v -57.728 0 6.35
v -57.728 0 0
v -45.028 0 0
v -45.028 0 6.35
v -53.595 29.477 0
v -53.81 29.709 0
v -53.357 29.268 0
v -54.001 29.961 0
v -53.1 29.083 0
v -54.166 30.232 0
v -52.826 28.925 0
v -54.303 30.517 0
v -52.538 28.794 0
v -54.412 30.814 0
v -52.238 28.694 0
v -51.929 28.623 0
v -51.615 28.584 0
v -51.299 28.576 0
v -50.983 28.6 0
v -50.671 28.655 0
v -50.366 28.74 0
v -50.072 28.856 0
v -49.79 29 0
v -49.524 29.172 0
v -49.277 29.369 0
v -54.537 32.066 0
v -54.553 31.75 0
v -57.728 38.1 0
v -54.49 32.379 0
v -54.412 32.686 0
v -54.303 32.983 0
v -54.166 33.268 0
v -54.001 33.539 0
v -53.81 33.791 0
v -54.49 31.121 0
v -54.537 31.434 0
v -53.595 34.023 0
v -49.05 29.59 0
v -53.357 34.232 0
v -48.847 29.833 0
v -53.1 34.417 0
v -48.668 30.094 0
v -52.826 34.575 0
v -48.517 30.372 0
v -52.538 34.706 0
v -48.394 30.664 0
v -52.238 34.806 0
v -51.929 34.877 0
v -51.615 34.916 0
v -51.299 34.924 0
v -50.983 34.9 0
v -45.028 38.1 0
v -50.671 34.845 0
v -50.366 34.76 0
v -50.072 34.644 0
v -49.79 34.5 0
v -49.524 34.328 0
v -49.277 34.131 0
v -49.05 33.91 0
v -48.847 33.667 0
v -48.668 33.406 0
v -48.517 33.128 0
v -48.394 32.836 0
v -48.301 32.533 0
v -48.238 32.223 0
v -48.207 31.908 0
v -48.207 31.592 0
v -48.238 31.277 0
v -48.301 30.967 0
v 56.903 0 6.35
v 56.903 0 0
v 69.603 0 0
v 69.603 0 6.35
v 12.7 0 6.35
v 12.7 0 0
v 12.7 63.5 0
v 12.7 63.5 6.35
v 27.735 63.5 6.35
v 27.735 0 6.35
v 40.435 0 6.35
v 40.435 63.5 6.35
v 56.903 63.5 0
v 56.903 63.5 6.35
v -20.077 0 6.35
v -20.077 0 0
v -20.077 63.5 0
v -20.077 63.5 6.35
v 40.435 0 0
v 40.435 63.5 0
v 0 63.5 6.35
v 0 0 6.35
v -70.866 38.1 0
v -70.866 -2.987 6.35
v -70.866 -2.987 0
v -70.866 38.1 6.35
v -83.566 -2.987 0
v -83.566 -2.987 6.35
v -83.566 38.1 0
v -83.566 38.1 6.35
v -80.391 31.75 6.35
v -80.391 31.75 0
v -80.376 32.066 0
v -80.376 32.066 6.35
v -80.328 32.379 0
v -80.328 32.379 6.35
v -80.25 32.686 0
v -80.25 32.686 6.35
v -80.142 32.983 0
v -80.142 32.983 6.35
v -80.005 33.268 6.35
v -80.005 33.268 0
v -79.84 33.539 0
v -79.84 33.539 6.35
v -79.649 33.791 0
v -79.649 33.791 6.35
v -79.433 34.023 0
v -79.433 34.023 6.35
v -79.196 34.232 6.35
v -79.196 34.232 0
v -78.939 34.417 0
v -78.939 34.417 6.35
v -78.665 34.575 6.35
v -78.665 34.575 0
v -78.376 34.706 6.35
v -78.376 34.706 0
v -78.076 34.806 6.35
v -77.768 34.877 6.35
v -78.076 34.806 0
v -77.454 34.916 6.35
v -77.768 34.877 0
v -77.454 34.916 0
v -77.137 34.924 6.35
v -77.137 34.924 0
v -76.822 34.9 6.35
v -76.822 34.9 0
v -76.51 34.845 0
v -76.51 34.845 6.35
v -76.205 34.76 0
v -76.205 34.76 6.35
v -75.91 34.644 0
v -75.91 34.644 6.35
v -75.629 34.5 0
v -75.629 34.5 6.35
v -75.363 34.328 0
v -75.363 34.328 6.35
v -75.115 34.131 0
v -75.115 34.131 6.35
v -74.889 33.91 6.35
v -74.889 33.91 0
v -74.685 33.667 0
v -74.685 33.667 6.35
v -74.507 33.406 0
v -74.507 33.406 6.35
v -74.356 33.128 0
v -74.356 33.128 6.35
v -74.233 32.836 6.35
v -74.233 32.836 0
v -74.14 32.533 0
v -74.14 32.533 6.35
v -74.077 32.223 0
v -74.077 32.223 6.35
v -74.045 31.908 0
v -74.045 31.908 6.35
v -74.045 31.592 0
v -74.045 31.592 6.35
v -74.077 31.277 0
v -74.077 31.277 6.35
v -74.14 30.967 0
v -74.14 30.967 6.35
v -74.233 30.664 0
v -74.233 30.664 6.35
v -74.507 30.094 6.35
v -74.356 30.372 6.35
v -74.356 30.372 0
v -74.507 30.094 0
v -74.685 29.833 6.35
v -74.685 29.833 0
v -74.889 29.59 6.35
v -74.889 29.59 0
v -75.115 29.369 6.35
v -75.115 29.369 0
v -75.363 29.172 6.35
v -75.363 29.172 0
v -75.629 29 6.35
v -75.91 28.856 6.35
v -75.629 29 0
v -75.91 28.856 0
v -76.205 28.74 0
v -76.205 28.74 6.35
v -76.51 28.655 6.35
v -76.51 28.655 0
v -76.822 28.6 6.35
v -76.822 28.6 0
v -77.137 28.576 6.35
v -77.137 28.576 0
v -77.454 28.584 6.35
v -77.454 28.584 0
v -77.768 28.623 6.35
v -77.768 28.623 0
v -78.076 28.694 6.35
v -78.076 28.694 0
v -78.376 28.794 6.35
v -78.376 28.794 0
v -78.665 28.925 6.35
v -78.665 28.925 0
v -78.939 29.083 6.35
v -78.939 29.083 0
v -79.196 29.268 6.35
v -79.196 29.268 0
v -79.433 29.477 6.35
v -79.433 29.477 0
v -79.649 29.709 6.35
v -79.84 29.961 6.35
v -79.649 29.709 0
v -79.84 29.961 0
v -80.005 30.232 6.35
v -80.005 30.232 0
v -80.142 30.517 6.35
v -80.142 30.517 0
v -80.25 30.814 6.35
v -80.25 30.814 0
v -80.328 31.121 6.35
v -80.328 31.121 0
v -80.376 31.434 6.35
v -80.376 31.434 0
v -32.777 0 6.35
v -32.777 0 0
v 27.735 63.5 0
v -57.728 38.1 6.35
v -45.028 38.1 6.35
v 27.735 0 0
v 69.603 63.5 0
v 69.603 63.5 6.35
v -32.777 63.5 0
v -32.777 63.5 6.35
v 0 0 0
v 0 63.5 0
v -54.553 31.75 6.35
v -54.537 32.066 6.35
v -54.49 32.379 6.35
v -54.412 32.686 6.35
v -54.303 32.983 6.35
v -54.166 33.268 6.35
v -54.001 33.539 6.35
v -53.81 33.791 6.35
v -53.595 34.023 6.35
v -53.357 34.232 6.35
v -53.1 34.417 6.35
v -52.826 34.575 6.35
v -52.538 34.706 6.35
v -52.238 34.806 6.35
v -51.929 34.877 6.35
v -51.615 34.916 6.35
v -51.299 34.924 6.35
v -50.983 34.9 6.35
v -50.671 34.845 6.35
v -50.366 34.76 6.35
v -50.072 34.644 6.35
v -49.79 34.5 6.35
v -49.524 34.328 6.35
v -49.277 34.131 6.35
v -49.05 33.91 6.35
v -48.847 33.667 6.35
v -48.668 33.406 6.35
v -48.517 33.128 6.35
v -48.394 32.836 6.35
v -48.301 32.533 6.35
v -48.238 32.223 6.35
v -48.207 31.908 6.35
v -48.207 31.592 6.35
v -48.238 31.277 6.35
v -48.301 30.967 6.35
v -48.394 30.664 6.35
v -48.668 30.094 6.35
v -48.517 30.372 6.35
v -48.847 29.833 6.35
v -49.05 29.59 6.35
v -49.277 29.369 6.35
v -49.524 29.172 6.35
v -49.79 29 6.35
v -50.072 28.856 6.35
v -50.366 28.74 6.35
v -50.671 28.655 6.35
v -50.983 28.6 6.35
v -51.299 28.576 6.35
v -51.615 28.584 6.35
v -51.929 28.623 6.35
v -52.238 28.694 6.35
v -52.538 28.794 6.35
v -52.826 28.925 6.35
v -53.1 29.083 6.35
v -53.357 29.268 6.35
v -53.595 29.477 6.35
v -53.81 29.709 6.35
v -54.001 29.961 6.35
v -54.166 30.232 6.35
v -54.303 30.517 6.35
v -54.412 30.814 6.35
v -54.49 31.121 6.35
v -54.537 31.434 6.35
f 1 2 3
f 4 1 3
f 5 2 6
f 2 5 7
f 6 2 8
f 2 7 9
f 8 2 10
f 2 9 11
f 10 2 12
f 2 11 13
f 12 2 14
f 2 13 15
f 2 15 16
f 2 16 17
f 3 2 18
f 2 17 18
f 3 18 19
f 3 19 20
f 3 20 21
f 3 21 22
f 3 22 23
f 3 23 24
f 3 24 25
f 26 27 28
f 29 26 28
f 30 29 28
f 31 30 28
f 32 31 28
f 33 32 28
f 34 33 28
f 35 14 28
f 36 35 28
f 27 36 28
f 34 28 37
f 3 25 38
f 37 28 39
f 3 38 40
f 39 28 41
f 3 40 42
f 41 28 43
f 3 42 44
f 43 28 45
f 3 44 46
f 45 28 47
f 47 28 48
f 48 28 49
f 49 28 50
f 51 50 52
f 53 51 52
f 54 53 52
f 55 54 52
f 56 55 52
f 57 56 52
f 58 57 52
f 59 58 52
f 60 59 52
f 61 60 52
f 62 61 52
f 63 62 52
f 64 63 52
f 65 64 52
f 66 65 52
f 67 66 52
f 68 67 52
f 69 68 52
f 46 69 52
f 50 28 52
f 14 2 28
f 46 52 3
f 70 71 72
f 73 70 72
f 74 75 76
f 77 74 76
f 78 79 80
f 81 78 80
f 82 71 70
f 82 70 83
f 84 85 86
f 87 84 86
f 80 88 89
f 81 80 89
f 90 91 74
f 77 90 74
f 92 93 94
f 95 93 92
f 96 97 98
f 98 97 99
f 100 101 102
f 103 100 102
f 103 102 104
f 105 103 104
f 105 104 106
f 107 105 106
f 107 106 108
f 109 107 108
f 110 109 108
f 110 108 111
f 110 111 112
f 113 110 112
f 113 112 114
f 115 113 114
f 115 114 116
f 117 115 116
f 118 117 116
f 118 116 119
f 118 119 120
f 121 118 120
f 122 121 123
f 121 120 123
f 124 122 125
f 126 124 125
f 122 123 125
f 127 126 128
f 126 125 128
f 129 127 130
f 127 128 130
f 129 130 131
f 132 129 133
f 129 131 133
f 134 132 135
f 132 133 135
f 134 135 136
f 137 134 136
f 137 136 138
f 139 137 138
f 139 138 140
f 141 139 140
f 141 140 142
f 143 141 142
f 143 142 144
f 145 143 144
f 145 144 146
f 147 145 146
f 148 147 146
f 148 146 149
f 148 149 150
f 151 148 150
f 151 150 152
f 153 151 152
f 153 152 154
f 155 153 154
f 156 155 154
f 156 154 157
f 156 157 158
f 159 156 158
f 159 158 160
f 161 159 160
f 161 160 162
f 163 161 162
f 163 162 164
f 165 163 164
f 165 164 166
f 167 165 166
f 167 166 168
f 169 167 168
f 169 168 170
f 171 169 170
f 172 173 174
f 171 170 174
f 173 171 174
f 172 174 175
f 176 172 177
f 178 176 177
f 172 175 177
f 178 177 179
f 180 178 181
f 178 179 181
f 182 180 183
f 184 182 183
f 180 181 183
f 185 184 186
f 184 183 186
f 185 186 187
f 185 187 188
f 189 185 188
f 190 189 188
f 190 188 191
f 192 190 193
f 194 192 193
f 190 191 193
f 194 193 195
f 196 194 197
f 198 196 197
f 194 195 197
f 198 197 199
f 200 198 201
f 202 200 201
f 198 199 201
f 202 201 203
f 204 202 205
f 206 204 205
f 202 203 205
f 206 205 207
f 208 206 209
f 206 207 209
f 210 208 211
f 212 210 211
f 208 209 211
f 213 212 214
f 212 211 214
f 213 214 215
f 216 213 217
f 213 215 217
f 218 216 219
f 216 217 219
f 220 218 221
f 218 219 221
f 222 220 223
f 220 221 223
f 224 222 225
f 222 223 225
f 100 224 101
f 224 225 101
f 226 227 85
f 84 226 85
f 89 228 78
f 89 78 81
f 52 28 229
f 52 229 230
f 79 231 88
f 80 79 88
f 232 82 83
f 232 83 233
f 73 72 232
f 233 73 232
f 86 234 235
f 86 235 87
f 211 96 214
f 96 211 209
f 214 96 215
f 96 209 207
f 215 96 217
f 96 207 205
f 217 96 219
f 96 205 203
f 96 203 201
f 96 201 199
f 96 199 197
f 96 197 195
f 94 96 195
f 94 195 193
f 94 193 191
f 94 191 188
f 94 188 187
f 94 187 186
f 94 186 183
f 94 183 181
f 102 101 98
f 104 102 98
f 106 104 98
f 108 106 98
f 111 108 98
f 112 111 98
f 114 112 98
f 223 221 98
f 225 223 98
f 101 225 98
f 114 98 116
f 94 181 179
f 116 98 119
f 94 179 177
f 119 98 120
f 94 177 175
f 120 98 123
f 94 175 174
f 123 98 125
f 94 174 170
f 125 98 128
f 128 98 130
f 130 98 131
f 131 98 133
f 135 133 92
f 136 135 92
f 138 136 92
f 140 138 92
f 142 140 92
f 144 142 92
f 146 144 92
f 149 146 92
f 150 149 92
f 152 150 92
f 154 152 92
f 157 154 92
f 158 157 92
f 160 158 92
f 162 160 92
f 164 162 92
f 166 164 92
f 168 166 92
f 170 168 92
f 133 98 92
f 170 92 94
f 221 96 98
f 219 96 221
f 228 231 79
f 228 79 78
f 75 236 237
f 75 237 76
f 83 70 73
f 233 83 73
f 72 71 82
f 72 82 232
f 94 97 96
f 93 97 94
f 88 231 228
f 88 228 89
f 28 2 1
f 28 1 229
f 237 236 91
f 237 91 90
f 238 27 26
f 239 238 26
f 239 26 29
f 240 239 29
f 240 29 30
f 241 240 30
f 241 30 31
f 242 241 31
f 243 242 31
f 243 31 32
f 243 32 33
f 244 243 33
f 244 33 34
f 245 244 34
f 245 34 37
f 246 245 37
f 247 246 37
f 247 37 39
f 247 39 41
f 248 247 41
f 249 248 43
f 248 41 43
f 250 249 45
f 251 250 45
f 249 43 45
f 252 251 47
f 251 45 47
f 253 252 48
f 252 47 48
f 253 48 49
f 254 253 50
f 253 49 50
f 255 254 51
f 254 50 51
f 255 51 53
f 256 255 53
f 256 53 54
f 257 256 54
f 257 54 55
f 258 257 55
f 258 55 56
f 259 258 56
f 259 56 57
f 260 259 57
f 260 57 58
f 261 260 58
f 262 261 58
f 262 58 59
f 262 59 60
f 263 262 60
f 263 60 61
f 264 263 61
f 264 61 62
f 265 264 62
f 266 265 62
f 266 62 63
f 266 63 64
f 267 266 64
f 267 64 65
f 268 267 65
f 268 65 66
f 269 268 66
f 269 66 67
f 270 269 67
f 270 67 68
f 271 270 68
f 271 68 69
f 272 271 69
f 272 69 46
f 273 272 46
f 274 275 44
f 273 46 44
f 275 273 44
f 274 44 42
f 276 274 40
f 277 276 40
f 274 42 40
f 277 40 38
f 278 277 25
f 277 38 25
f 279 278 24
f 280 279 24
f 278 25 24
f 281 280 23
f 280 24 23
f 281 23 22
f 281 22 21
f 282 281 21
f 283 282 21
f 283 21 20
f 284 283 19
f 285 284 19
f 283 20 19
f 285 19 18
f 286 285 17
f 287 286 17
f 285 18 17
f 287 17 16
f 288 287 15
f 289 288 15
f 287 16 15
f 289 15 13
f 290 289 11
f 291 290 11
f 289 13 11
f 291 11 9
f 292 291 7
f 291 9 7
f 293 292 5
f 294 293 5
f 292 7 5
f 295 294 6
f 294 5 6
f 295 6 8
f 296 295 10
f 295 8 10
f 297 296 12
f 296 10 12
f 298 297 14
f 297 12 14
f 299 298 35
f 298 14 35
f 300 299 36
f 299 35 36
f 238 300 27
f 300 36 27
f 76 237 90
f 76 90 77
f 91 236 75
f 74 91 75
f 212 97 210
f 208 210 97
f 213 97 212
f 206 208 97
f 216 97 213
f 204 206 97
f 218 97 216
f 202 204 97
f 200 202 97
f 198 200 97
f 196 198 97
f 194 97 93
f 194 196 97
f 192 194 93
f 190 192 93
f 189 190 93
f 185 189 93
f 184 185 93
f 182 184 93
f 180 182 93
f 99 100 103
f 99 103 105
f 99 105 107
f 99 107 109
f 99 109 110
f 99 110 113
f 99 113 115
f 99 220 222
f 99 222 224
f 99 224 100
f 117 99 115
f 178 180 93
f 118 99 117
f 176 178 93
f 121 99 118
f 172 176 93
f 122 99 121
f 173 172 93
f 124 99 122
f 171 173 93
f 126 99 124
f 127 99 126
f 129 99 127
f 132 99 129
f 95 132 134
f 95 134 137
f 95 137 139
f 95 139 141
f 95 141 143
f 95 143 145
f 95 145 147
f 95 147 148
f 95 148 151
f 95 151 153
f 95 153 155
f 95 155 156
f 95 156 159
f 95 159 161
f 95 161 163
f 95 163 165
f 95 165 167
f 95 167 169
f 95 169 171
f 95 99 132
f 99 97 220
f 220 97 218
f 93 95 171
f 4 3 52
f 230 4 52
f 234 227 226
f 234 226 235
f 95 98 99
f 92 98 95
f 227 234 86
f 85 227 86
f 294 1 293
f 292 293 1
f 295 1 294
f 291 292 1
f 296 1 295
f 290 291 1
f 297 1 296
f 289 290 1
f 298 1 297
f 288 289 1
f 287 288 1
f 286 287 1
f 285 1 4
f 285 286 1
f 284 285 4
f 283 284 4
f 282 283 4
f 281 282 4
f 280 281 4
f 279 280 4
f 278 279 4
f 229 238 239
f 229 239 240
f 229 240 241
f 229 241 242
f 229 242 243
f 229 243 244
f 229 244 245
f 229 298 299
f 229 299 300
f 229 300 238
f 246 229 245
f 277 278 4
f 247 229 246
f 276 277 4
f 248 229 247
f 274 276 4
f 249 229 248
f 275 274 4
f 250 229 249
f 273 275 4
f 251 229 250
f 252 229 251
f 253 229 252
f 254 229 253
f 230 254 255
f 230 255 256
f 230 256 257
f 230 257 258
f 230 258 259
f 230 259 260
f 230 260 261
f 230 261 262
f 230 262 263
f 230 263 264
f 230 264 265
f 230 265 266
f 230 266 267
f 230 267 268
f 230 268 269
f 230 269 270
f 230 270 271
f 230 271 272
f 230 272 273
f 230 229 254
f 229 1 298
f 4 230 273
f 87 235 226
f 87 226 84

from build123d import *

# Parameters (mm, degrees)
F0_W     = 12.7
F0_H     = 38.1
F1_DEPTH = 6.35
F0_H_2   = 63.5
F3_D     = 6.35
F3_DEPTH = 63.5
F3_TIP   = 1.9077324654
F5_D     = 6.35
F5_DEPTH = 63.5
F5_TIP   = 1.9077324654
F6_W     = 12.7
F6_H     = 2.9874345932
F7_DEPTH = 6.35


with BuildPart() as f1:
    # F0 (on Top) → F1 (new body)
    with BuildSketch(Plane.XY):
        with Locations((-77.2163314581, 19.05)):
            Rectangle(F0_W, F0_H)
    extrude(amount=F1_DEPTH)

    # F3
    with Locations(Plane.XY.offset(6.35)):
        with Locations((-77.2163314581, 31.75)):
            Hole(F3_D / 2, depth=F3_DEPTH)
            with Locations((0, 0, -(F3_DEPTH + F3_TIP / 2))):  # 118° drill point
                Cone(0, F3_D / 2, F3_TIP, mode=Mode.SUBTRACT)

    # F6 (on face) → F7 (join)
    with BuildSketch(Plane.XY.offset(6.35)):
        with Locations((-77.2163314581, -1.4937172966)):
            Rectangle(F6_W, F6_H)
    extrude(amount=-F7_DEPTH)


with BuildPart() as f1b:
    # F0 (on Top) → F1, piece 2 (new body)
    with BuildSketch(Plane.XY):
        with Locations((-51.3776572585, 19.05)):
            Rectangle(F0_W, F0_H)
    extrude(amount=F1_DEPTH)

    # F5
    with Locations(Plane.XY.offset(6.35)):
        with Locations((-51.3776572585, 31.75)):
            Hole(F5_D / 2, depth=F5_DEPTH)
            with Locations((0, 0, -(F5_DEPTH + F5_TIP / 2))):  # 118° drill point
                Cone(0, F5_D / 2, F5_TIP, mode=Mode.SUBTRACT)


with BuildPart() as f1c:
    # F0 (on Top) → F1, piece 3 (new body)
    with BuildSketch(Plane.XY):
        with Locations((-26.4272063859, 31.75)):
            Rectangle(F0_W, F0_H_2)
    extrude(amount=F1_DEPTH)


with BuildPart() as f1d:
    # F0 (on Top) → F1, piece 4 (new body)
    with BuildSketch(Plane.XY):
        with Locations((6.35, 31.75)):
            Rectangle(F0_W, F0_H_2)
    extrude(amount=F1_DEPTH)


with BuildPart() as f1e:
    # F0 (on Top) → F1, piece 5 (new body)
    with BuildSketch(Plane.XY):
        with Locations((34.0845628316, 31.75)):
            Rectangle(F0_W, F0_H_2)
    extrude(amount=F1_DEPTH)


with BuildPart() as f1f:
    # F0 (on Top) → F1, piece 6 (new body)
    with BuildSketch(Plane.XY):
        with Locations((63.2525911391, 31.75)):
            Rectangle(F0_W, F0_H_2)
    extrude(amount=F1_DEPTH)


solid = Compound([f1.part, f1b.part, f1c.part, f1d.part, f1e.part, f1f.part])
